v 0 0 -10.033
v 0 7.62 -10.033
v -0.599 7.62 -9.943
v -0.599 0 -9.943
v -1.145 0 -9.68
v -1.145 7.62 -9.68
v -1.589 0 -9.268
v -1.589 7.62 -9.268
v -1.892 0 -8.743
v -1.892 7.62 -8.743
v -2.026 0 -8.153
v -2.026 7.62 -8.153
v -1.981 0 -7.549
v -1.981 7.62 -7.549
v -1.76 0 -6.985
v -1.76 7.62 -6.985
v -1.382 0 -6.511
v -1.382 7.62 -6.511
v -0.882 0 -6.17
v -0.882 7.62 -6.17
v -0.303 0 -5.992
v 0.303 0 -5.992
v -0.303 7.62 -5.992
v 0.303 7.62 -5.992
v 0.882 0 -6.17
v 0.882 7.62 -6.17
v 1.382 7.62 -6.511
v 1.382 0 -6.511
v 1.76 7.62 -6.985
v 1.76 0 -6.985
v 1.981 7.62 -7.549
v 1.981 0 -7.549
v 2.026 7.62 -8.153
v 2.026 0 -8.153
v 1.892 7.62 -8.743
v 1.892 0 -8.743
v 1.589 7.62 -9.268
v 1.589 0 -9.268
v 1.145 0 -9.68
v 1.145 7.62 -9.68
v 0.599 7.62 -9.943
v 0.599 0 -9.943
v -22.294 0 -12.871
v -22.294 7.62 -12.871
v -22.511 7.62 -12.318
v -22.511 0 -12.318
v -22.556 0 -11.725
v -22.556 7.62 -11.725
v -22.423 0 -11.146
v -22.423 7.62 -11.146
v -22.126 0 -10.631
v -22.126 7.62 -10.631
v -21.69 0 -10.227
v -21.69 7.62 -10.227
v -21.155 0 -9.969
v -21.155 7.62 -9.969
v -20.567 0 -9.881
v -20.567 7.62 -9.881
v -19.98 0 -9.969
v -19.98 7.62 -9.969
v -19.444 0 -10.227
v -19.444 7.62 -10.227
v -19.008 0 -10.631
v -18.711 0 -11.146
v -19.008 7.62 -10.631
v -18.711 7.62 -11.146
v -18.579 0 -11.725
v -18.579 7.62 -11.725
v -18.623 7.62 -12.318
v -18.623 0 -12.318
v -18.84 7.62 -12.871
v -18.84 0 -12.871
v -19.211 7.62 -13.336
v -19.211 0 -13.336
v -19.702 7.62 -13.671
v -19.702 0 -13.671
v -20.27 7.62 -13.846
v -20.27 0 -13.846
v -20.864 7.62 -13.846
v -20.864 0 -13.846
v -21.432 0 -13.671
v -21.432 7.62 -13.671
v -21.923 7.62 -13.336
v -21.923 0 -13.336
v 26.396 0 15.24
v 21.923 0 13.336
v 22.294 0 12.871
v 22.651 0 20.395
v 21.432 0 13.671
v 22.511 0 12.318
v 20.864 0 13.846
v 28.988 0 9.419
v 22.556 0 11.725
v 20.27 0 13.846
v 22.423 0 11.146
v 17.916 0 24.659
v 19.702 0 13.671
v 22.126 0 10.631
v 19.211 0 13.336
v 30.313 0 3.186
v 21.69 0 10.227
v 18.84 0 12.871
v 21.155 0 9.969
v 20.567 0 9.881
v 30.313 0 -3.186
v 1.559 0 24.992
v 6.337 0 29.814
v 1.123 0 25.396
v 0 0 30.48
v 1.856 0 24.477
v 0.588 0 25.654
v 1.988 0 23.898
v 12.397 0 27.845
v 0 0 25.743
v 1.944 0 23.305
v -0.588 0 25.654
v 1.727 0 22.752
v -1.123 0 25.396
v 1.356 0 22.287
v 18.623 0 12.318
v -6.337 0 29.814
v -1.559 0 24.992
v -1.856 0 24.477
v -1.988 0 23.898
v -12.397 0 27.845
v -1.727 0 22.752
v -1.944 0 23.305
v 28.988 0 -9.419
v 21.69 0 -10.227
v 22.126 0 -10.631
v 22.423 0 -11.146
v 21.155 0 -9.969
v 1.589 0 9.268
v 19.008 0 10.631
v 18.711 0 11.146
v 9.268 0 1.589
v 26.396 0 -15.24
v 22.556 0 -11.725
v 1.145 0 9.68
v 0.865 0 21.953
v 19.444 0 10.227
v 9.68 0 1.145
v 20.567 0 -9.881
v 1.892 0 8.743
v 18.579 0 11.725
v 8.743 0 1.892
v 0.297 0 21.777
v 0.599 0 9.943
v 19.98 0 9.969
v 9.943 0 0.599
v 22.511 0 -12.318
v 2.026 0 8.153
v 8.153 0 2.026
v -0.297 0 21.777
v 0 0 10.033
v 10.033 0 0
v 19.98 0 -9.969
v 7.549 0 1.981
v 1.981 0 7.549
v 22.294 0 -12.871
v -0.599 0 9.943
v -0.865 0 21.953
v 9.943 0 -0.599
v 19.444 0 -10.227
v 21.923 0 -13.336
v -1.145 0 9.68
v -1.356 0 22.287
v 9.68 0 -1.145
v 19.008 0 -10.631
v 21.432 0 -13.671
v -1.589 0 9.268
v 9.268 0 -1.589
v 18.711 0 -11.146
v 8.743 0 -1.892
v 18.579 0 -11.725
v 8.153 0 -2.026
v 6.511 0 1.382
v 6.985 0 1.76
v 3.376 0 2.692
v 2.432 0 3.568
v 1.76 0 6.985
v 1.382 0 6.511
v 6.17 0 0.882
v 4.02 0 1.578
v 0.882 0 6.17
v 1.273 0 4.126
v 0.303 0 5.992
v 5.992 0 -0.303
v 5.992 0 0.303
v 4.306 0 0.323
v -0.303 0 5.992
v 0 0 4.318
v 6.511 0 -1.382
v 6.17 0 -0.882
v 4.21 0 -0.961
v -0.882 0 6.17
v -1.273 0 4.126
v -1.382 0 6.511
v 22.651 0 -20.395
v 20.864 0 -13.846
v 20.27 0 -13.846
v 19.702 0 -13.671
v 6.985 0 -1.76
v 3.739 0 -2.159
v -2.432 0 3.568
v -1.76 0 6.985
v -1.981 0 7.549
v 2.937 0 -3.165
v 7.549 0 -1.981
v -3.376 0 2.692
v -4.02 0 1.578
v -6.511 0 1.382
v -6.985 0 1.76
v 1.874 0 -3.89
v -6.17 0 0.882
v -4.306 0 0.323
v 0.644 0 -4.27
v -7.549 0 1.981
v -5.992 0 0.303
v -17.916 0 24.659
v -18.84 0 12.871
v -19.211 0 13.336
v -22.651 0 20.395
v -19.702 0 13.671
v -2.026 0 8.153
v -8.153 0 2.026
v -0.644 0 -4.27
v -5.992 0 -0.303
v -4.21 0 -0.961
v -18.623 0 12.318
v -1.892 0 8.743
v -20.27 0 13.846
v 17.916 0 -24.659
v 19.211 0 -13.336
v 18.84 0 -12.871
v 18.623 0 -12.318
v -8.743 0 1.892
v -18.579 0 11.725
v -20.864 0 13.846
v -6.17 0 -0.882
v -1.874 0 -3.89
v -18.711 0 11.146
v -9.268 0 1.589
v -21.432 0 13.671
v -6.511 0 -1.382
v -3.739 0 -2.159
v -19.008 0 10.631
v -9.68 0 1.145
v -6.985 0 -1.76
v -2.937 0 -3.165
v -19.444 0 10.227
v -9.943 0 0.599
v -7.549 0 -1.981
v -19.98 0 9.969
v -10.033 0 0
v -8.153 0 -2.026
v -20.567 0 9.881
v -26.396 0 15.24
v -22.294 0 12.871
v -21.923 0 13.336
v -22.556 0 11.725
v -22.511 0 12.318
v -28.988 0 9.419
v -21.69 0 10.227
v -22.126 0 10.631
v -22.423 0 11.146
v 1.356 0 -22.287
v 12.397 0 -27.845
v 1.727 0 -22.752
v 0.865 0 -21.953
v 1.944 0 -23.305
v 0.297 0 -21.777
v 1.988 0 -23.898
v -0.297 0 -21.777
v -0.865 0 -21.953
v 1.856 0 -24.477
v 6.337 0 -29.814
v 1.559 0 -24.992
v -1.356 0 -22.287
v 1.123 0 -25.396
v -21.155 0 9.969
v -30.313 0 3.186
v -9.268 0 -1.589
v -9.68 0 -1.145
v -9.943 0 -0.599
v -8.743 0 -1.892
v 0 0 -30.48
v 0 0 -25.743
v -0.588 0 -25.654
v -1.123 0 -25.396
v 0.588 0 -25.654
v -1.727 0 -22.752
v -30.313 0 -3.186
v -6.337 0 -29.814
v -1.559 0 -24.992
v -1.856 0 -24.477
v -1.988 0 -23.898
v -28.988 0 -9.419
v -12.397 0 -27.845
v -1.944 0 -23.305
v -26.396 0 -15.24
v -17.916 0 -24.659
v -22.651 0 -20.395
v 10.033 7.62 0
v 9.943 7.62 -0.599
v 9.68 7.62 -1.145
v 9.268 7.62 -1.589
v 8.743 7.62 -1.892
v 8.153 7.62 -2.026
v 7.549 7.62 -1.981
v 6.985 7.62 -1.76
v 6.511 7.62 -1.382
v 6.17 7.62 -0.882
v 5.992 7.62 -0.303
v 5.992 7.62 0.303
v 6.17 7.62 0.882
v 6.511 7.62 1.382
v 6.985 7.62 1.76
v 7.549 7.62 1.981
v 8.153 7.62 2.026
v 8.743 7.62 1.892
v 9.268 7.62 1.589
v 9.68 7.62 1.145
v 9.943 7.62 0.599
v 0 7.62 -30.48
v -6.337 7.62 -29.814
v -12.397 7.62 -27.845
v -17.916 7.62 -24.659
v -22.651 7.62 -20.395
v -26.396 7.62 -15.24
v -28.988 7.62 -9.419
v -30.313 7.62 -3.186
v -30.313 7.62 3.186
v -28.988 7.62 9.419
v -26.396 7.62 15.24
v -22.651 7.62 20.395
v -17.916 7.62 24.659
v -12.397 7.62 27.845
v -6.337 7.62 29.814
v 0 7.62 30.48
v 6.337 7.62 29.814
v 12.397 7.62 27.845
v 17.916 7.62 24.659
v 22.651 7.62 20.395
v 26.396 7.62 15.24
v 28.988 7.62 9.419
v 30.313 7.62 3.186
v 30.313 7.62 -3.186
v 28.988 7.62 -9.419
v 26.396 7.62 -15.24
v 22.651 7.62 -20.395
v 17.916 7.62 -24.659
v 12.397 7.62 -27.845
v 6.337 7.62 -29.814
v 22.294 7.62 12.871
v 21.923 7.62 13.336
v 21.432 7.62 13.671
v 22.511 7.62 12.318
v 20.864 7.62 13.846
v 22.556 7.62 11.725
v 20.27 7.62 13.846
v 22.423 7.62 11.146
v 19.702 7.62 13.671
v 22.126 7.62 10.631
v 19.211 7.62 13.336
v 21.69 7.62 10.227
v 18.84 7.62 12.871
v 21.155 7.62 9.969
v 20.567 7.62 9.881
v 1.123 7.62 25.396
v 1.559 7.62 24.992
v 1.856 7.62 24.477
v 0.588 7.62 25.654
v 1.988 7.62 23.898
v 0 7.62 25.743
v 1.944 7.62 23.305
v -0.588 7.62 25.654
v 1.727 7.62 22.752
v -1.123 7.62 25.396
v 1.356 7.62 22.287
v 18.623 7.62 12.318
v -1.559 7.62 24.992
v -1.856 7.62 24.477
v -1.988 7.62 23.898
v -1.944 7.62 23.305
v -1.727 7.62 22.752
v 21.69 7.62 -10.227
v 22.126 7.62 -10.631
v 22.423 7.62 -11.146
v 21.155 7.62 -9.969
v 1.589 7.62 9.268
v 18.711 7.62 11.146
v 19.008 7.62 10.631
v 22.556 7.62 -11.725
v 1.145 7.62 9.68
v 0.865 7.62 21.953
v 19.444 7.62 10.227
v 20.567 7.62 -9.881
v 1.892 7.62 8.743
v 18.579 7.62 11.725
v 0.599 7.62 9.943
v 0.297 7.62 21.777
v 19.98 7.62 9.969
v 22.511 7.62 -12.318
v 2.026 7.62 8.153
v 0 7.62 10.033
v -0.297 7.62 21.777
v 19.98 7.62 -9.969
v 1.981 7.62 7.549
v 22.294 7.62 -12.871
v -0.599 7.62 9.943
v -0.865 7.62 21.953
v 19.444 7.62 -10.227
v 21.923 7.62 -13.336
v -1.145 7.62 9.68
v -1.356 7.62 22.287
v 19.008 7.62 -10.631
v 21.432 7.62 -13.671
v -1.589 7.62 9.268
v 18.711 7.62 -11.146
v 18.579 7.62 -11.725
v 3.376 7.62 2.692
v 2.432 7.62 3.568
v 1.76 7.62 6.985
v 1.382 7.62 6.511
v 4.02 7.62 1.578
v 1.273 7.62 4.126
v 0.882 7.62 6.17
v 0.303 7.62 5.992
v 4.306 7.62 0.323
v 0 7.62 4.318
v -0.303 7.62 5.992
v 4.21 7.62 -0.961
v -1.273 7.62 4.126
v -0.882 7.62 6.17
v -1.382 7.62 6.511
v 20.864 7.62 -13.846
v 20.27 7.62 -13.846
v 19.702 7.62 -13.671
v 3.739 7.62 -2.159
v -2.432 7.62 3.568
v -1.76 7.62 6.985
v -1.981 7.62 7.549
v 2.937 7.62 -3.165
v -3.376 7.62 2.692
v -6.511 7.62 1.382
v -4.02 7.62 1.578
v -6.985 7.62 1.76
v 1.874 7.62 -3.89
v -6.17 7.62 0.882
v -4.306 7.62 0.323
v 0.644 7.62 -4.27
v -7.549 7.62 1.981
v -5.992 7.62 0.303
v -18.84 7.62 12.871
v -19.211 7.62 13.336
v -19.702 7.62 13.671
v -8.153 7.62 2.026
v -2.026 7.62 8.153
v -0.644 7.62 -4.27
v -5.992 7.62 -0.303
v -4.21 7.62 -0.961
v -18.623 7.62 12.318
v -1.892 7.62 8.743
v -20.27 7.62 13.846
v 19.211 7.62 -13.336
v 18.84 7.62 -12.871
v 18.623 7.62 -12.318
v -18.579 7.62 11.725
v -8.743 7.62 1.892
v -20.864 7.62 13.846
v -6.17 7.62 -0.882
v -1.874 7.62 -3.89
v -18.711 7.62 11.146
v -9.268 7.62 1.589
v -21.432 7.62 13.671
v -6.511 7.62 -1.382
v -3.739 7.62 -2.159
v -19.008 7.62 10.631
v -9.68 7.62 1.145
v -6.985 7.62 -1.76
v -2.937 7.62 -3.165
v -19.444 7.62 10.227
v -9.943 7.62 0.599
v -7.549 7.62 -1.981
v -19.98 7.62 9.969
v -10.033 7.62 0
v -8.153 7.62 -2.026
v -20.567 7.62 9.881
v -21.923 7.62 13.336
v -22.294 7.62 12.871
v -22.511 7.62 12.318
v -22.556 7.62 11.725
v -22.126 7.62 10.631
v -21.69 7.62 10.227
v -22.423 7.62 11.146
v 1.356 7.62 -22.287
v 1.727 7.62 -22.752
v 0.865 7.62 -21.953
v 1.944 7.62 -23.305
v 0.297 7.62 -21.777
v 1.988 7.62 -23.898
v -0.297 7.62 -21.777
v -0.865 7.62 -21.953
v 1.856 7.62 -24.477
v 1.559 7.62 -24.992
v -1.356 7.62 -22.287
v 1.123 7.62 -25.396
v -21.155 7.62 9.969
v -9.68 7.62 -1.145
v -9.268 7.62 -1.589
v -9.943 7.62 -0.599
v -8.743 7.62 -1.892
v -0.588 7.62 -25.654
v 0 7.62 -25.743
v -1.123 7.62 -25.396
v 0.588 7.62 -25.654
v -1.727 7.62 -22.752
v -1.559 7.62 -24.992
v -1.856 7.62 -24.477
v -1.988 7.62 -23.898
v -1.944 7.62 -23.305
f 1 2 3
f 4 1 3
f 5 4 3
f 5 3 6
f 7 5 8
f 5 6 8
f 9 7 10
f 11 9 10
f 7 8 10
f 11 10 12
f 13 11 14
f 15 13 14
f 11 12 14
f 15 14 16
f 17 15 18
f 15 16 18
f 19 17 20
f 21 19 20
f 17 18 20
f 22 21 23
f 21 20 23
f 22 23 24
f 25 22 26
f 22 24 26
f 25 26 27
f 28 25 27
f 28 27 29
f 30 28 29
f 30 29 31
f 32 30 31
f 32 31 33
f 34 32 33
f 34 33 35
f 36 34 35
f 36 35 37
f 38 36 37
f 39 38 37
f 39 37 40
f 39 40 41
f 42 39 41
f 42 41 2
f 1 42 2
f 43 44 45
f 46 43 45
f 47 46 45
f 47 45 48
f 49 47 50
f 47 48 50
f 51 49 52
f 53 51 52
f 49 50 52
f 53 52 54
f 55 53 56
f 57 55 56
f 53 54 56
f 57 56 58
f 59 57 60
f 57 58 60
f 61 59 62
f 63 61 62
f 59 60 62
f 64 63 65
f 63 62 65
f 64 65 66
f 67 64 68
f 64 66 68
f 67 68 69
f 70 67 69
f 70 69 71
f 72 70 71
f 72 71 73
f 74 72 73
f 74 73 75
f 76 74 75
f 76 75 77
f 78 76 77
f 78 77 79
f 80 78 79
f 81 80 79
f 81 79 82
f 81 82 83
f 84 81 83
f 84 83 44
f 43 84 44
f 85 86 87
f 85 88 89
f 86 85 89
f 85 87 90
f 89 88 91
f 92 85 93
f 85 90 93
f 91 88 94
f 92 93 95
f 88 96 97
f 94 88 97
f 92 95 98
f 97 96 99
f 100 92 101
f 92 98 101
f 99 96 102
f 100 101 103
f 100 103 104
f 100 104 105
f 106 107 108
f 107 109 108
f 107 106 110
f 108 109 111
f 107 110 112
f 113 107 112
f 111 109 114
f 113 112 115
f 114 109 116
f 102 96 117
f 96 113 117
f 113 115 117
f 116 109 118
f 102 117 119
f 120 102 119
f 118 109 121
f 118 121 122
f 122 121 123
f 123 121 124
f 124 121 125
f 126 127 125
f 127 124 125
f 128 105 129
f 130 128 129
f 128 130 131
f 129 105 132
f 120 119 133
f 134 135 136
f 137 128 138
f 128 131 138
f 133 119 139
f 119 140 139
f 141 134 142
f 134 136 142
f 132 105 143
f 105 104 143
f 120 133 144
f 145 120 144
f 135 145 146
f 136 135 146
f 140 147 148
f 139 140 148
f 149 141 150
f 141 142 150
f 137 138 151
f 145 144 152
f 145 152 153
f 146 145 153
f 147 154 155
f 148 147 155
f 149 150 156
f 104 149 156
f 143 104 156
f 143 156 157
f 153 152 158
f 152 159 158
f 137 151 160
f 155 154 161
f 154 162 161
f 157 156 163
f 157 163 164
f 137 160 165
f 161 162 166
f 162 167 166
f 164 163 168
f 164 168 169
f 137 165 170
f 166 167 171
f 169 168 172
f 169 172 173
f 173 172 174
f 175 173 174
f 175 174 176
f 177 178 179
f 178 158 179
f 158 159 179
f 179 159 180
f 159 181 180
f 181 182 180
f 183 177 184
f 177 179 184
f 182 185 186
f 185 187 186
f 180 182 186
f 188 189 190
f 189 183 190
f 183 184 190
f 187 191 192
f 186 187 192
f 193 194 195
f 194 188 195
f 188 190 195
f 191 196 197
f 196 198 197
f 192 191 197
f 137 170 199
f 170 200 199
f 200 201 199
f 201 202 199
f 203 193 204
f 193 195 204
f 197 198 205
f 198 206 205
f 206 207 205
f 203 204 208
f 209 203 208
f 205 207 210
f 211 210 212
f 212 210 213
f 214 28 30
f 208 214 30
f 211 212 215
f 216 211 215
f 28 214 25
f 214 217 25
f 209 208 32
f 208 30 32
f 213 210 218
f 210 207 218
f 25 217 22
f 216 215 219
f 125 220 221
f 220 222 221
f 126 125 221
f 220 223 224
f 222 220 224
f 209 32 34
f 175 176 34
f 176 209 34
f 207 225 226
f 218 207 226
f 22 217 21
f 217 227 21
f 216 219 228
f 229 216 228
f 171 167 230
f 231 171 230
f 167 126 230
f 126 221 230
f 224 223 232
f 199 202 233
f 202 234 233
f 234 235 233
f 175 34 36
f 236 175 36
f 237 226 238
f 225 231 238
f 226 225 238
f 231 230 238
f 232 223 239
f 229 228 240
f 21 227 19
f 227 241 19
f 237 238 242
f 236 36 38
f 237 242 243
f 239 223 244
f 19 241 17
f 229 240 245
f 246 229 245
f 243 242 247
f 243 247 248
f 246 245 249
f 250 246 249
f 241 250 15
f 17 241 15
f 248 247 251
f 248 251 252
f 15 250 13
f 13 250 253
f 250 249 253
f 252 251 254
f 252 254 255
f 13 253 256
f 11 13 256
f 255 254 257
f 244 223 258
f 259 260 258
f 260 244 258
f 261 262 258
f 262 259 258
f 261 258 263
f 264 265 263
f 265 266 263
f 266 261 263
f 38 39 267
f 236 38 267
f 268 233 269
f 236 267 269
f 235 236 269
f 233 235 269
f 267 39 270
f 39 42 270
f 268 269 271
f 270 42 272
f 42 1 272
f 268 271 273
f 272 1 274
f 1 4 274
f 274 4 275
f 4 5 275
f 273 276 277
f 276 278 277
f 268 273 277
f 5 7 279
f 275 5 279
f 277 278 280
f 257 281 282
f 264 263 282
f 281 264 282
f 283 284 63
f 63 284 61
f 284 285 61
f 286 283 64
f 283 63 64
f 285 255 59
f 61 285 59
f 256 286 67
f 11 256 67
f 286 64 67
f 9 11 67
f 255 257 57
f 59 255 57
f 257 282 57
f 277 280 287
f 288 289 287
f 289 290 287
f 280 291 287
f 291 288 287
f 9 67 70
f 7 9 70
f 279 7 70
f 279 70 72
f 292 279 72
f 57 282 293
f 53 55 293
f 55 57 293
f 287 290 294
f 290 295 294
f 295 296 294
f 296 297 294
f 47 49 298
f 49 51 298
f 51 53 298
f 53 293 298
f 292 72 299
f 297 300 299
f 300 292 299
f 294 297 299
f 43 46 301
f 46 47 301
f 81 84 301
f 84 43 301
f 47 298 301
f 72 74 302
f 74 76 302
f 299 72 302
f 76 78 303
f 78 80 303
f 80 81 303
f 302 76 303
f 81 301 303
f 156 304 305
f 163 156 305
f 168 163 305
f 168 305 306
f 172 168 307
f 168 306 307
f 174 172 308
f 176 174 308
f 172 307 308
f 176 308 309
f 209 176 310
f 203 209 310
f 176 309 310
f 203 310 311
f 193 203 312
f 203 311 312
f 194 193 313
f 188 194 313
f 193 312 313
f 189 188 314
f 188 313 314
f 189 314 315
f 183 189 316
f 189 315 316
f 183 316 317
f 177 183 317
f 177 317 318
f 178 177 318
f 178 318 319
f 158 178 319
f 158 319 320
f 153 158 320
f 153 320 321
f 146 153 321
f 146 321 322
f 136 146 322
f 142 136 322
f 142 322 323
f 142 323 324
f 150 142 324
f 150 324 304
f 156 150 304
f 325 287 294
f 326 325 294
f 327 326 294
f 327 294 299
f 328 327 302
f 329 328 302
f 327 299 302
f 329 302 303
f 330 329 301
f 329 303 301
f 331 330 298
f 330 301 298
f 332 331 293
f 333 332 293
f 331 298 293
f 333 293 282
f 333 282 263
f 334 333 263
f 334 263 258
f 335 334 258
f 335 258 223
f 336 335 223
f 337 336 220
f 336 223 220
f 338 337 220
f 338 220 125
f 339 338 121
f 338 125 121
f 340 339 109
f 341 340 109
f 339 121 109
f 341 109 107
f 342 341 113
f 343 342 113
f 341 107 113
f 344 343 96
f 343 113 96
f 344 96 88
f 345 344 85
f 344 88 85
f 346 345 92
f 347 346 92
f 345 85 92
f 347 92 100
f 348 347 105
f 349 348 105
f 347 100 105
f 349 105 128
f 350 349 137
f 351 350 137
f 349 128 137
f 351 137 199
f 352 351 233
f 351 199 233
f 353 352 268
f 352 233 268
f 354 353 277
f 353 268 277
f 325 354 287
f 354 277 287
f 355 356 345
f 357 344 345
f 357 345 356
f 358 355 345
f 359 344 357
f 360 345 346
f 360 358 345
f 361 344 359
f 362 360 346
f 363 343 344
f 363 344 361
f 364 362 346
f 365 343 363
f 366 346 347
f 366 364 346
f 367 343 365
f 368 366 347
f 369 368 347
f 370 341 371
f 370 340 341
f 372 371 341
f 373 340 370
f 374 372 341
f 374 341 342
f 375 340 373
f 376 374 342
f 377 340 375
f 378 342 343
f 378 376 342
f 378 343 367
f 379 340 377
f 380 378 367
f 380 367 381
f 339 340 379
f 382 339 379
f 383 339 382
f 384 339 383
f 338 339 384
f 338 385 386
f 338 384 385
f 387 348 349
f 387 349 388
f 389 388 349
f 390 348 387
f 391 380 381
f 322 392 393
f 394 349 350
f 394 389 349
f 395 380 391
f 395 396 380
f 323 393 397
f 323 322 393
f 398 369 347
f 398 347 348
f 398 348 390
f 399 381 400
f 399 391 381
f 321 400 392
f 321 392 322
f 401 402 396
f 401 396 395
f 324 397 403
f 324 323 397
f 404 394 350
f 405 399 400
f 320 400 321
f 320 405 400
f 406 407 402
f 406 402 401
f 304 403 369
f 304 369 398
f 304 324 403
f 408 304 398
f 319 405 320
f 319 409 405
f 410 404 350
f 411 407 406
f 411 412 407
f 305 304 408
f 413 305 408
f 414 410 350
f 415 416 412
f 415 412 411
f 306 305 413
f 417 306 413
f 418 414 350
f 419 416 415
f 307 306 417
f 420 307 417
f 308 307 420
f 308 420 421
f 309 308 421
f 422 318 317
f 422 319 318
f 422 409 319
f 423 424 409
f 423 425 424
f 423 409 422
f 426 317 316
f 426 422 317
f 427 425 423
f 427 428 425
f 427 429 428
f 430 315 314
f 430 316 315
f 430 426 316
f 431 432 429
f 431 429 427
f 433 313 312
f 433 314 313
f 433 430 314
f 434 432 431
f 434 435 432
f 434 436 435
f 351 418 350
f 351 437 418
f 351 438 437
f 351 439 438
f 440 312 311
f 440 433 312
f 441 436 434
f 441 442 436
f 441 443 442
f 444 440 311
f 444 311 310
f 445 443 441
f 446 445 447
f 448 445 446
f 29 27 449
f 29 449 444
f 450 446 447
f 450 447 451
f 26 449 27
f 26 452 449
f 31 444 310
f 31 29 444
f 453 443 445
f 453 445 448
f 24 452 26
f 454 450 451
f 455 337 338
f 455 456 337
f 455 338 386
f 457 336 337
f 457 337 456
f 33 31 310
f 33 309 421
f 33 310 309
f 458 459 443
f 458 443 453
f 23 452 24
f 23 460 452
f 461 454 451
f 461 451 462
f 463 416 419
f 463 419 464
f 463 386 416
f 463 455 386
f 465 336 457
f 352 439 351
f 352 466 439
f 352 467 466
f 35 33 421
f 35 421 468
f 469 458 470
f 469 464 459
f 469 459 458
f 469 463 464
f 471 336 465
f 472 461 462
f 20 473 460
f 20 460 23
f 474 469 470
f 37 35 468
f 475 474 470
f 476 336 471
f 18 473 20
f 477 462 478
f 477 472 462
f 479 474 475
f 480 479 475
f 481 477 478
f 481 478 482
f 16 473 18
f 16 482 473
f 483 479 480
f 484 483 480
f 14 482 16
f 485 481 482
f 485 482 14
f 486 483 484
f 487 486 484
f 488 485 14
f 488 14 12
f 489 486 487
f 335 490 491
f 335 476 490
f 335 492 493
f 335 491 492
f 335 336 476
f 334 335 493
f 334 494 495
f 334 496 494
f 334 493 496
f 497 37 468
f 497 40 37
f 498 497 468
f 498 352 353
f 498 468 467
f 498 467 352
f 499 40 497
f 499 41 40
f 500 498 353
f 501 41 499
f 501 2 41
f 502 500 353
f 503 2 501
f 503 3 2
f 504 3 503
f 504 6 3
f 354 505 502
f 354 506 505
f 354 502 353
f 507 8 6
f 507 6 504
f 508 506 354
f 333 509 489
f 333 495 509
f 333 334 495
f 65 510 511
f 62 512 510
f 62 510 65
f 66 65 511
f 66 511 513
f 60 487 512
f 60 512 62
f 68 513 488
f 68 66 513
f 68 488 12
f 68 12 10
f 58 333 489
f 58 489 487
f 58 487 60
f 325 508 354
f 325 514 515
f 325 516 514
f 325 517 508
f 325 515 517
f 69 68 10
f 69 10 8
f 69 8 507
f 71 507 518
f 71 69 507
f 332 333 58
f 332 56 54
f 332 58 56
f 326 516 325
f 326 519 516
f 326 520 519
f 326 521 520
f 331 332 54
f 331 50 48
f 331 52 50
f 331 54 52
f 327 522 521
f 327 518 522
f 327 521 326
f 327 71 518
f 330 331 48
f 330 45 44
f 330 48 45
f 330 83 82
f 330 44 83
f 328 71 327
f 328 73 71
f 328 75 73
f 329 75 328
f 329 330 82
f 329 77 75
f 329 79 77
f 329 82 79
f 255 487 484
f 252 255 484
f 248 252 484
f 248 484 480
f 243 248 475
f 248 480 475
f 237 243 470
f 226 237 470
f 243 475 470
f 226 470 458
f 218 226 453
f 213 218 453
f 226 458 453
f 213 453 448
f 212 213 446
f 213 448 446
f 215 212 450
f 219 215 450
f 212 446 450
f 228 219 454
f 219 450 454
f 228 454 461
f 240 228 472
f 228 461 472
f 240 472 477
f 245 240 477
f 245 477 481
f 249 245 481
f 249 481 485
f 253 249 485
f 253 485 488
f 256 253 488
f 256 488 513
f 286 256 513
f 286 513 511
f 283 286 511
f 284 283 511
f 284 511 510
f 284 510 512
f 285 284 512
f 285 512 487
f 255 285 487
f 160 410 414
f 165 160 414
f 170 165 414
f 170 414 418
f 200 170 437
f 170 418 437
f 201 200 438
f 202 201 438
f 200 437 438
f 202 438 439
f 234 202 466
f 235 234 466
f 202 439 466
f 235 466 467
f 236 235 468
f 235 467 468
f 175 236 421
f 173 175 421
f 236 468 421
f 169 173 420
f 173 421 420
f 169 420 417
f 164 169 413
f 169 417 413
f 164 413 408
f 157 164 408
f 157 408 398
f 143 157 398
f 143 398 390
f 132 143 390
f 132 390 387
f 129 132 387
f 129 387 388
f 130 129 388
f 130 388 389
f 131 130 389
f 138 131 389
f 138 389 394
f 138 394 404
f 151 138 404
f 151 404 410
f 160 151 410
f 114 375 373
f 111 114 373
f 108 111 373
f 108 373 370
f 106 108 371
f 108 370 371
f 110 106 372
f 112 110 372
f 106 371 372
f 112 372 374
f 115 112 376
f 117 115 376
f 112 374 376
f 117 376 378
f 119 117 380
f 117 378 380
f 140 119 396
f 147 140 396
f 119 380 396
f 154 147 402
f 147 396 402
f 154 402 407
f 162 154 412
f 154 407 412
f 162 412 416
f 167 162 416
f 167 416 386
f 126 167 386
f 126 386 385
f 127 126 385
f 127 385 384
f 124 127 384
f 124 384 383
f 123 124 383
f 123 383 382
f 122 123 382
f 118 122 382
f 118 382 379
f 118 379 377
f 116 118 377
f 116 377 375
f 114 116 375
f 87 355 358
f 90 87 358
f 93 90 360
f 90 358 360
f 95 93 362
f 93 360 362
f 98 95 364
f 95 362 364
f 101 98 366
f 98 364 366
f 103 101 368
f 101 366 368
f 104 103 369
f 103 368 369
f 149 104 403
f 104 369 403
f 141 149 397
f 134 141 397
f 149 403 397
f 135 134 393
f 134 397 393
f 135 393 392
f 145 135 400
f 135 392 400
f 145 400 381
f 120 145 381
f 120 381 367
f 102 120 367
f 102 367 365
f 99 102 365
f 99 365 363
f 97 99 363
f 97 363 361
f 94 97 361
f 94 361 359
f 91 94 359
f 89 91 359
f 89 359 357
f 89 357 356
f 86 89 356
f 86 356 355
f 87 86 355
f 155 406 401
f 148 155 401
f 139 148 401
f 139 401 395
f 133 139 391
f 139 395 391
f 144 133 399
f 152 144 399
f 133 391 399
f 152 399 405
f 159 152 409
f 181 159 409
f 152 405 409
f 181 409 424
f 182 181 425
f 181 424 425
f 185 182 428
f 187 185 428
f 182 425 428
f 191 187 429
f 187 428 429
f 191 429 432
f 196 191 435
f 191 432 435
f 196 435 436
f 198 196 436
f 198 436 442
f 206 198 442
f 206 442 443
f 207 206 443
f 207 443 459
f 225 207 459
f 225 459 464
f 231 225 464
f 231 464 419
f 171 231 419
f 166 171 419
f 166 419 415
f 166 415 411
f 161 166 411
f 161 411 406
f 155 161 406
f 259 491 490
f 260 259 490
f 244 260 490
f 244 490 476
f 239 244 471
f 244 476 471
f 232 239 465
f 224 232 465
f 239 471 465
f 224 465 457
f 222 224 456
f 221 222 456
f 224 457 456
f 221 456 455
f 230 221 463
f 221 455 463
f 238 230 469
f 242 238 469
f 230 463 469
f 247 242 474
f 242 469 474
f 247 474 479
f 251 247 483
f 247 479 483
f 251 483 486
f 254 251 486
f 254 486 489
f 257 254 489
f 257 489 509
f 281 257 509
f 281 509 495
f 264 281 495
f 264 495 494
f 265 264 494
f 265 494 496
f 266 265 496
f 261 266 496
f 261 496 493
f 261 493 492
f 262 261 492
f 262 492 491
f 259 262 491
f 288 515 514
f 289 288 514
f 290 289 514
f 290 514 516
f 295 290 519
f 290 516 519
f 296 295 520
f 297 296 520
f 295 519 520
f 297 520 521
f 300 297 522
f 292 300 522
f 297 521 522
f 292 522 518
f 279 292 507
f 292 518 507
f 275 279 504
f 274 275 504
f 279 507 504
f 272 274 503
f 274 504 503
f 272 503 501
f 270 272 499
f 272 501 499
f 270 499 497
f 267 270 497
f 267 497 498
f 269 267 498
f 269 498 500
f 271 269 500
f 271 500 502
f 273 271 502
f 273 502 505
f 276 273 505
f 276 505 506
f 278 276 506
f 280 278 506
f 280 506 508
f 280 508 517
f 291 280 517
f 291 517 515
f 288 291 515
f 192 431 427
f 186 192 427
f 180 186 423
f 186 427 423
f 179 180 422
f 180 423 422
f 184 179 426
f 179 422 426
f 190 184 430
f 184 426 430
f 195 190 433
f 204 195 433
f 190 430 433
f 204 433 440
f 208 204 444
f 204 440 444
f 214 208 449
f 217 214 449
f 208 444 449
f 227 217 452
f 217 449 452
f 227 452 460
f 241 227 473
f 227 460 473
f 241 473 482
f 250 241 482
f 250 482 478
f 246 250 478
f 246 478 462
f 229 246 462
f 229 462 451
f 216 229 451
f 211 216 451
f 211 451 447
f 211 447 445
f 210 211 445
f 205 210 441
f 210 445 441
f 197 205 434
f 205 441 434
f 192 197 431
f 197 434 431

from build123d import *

# Parameters (mm, degrees)
SKETCH1_R           = 30.48
BOSS_EXTRUDE1_DEPTH = 7.62
SKETCH2_R           = 1.9939
CUT_EXTRUDE1_DEPTH  = 44.773567367
CIRPATTERN1_COUNT   = 6
SKETCH3_R           = 4.318
SKETCH3_R_2         = 2.032
CUT_EXTRUDE2_DEPTH  = 44.773567367
CIRPATTERN2_COUNT   = 4


with BuildPart() as part:
    # Sketch1 → Boss-Extrude1 (new body)
    with BuildSketch(Plane(origin=(0, 0, 0), x_dir=(1, 0, 0), z_dir=(0, 1, 0))):
        with Locations(Location((0, 0, 0), (0, 0, 90))):
            Circle(SKETCH1_R)
    extrude(amount=BOSS_EXTRUDE1_DEPTH)

    # Sketch2 → Cut-Extrude1 (cut, through all)
    with BuildSketch(Plane(origin=(0, 7.62, 0), x_dir=(1, 0, 0), z_dir=(0, 1, 0))):
        with Locations(Location((0, -23.749, 0), (0, 0, 270))):
            Circle(SKETCH2_R)
    cut_extrude1 = extrude(amount=-CUT_EXTRUDE1_DEPTH, mode=Mode.SUBTRACT)

    # CirPattern1: Cut-Extrude1 ×6 about axis
    cirpattern1_axis = Axis((0, 0, 0), (0, 1, 0))
    for i in range(1, CIRPATTERN1_COUNT):
        add(cut_extrude1.rotate(cirpattern1_axis, i * 360 / CIRPATTERN1_COUNT), mode=Mode.SUBTRACT)

    # Sketch3 → Cut-Extrude2 (cut, through all)
    with BuildSketch(Plane(origin=(0, 7.62, 0), x_dir=(1, 0, 0), z_dir=(0, 1, 0))):
        with Locations(Location((0, 0, 0), (0, 0, 270))):
            Circle(SKETCH3_R)
        with Locations(Location((0, -8.001, 0), (0, 0, 270))):
            Circle(SKETCH3_R_2)
    cut_extrude2 = extrude(amount=-CUT_EXTRUDE2_DEPTH, mode=Mode.SUBTRACT)

    # CirPattern2: Cut-Extrude2 ×4 about axis
    cirpattern2_axis = Axis((0, 0, 0), (0, 1, 0))
    for i in range(1, CIRPATTERN2_COUNT):
        add(cut_extrude2.rotate(cirpattern2_axis, i * 360 / CIRPATTERN2_COUNT), mode=Mode.SUBTRACT)


solid = part.part
